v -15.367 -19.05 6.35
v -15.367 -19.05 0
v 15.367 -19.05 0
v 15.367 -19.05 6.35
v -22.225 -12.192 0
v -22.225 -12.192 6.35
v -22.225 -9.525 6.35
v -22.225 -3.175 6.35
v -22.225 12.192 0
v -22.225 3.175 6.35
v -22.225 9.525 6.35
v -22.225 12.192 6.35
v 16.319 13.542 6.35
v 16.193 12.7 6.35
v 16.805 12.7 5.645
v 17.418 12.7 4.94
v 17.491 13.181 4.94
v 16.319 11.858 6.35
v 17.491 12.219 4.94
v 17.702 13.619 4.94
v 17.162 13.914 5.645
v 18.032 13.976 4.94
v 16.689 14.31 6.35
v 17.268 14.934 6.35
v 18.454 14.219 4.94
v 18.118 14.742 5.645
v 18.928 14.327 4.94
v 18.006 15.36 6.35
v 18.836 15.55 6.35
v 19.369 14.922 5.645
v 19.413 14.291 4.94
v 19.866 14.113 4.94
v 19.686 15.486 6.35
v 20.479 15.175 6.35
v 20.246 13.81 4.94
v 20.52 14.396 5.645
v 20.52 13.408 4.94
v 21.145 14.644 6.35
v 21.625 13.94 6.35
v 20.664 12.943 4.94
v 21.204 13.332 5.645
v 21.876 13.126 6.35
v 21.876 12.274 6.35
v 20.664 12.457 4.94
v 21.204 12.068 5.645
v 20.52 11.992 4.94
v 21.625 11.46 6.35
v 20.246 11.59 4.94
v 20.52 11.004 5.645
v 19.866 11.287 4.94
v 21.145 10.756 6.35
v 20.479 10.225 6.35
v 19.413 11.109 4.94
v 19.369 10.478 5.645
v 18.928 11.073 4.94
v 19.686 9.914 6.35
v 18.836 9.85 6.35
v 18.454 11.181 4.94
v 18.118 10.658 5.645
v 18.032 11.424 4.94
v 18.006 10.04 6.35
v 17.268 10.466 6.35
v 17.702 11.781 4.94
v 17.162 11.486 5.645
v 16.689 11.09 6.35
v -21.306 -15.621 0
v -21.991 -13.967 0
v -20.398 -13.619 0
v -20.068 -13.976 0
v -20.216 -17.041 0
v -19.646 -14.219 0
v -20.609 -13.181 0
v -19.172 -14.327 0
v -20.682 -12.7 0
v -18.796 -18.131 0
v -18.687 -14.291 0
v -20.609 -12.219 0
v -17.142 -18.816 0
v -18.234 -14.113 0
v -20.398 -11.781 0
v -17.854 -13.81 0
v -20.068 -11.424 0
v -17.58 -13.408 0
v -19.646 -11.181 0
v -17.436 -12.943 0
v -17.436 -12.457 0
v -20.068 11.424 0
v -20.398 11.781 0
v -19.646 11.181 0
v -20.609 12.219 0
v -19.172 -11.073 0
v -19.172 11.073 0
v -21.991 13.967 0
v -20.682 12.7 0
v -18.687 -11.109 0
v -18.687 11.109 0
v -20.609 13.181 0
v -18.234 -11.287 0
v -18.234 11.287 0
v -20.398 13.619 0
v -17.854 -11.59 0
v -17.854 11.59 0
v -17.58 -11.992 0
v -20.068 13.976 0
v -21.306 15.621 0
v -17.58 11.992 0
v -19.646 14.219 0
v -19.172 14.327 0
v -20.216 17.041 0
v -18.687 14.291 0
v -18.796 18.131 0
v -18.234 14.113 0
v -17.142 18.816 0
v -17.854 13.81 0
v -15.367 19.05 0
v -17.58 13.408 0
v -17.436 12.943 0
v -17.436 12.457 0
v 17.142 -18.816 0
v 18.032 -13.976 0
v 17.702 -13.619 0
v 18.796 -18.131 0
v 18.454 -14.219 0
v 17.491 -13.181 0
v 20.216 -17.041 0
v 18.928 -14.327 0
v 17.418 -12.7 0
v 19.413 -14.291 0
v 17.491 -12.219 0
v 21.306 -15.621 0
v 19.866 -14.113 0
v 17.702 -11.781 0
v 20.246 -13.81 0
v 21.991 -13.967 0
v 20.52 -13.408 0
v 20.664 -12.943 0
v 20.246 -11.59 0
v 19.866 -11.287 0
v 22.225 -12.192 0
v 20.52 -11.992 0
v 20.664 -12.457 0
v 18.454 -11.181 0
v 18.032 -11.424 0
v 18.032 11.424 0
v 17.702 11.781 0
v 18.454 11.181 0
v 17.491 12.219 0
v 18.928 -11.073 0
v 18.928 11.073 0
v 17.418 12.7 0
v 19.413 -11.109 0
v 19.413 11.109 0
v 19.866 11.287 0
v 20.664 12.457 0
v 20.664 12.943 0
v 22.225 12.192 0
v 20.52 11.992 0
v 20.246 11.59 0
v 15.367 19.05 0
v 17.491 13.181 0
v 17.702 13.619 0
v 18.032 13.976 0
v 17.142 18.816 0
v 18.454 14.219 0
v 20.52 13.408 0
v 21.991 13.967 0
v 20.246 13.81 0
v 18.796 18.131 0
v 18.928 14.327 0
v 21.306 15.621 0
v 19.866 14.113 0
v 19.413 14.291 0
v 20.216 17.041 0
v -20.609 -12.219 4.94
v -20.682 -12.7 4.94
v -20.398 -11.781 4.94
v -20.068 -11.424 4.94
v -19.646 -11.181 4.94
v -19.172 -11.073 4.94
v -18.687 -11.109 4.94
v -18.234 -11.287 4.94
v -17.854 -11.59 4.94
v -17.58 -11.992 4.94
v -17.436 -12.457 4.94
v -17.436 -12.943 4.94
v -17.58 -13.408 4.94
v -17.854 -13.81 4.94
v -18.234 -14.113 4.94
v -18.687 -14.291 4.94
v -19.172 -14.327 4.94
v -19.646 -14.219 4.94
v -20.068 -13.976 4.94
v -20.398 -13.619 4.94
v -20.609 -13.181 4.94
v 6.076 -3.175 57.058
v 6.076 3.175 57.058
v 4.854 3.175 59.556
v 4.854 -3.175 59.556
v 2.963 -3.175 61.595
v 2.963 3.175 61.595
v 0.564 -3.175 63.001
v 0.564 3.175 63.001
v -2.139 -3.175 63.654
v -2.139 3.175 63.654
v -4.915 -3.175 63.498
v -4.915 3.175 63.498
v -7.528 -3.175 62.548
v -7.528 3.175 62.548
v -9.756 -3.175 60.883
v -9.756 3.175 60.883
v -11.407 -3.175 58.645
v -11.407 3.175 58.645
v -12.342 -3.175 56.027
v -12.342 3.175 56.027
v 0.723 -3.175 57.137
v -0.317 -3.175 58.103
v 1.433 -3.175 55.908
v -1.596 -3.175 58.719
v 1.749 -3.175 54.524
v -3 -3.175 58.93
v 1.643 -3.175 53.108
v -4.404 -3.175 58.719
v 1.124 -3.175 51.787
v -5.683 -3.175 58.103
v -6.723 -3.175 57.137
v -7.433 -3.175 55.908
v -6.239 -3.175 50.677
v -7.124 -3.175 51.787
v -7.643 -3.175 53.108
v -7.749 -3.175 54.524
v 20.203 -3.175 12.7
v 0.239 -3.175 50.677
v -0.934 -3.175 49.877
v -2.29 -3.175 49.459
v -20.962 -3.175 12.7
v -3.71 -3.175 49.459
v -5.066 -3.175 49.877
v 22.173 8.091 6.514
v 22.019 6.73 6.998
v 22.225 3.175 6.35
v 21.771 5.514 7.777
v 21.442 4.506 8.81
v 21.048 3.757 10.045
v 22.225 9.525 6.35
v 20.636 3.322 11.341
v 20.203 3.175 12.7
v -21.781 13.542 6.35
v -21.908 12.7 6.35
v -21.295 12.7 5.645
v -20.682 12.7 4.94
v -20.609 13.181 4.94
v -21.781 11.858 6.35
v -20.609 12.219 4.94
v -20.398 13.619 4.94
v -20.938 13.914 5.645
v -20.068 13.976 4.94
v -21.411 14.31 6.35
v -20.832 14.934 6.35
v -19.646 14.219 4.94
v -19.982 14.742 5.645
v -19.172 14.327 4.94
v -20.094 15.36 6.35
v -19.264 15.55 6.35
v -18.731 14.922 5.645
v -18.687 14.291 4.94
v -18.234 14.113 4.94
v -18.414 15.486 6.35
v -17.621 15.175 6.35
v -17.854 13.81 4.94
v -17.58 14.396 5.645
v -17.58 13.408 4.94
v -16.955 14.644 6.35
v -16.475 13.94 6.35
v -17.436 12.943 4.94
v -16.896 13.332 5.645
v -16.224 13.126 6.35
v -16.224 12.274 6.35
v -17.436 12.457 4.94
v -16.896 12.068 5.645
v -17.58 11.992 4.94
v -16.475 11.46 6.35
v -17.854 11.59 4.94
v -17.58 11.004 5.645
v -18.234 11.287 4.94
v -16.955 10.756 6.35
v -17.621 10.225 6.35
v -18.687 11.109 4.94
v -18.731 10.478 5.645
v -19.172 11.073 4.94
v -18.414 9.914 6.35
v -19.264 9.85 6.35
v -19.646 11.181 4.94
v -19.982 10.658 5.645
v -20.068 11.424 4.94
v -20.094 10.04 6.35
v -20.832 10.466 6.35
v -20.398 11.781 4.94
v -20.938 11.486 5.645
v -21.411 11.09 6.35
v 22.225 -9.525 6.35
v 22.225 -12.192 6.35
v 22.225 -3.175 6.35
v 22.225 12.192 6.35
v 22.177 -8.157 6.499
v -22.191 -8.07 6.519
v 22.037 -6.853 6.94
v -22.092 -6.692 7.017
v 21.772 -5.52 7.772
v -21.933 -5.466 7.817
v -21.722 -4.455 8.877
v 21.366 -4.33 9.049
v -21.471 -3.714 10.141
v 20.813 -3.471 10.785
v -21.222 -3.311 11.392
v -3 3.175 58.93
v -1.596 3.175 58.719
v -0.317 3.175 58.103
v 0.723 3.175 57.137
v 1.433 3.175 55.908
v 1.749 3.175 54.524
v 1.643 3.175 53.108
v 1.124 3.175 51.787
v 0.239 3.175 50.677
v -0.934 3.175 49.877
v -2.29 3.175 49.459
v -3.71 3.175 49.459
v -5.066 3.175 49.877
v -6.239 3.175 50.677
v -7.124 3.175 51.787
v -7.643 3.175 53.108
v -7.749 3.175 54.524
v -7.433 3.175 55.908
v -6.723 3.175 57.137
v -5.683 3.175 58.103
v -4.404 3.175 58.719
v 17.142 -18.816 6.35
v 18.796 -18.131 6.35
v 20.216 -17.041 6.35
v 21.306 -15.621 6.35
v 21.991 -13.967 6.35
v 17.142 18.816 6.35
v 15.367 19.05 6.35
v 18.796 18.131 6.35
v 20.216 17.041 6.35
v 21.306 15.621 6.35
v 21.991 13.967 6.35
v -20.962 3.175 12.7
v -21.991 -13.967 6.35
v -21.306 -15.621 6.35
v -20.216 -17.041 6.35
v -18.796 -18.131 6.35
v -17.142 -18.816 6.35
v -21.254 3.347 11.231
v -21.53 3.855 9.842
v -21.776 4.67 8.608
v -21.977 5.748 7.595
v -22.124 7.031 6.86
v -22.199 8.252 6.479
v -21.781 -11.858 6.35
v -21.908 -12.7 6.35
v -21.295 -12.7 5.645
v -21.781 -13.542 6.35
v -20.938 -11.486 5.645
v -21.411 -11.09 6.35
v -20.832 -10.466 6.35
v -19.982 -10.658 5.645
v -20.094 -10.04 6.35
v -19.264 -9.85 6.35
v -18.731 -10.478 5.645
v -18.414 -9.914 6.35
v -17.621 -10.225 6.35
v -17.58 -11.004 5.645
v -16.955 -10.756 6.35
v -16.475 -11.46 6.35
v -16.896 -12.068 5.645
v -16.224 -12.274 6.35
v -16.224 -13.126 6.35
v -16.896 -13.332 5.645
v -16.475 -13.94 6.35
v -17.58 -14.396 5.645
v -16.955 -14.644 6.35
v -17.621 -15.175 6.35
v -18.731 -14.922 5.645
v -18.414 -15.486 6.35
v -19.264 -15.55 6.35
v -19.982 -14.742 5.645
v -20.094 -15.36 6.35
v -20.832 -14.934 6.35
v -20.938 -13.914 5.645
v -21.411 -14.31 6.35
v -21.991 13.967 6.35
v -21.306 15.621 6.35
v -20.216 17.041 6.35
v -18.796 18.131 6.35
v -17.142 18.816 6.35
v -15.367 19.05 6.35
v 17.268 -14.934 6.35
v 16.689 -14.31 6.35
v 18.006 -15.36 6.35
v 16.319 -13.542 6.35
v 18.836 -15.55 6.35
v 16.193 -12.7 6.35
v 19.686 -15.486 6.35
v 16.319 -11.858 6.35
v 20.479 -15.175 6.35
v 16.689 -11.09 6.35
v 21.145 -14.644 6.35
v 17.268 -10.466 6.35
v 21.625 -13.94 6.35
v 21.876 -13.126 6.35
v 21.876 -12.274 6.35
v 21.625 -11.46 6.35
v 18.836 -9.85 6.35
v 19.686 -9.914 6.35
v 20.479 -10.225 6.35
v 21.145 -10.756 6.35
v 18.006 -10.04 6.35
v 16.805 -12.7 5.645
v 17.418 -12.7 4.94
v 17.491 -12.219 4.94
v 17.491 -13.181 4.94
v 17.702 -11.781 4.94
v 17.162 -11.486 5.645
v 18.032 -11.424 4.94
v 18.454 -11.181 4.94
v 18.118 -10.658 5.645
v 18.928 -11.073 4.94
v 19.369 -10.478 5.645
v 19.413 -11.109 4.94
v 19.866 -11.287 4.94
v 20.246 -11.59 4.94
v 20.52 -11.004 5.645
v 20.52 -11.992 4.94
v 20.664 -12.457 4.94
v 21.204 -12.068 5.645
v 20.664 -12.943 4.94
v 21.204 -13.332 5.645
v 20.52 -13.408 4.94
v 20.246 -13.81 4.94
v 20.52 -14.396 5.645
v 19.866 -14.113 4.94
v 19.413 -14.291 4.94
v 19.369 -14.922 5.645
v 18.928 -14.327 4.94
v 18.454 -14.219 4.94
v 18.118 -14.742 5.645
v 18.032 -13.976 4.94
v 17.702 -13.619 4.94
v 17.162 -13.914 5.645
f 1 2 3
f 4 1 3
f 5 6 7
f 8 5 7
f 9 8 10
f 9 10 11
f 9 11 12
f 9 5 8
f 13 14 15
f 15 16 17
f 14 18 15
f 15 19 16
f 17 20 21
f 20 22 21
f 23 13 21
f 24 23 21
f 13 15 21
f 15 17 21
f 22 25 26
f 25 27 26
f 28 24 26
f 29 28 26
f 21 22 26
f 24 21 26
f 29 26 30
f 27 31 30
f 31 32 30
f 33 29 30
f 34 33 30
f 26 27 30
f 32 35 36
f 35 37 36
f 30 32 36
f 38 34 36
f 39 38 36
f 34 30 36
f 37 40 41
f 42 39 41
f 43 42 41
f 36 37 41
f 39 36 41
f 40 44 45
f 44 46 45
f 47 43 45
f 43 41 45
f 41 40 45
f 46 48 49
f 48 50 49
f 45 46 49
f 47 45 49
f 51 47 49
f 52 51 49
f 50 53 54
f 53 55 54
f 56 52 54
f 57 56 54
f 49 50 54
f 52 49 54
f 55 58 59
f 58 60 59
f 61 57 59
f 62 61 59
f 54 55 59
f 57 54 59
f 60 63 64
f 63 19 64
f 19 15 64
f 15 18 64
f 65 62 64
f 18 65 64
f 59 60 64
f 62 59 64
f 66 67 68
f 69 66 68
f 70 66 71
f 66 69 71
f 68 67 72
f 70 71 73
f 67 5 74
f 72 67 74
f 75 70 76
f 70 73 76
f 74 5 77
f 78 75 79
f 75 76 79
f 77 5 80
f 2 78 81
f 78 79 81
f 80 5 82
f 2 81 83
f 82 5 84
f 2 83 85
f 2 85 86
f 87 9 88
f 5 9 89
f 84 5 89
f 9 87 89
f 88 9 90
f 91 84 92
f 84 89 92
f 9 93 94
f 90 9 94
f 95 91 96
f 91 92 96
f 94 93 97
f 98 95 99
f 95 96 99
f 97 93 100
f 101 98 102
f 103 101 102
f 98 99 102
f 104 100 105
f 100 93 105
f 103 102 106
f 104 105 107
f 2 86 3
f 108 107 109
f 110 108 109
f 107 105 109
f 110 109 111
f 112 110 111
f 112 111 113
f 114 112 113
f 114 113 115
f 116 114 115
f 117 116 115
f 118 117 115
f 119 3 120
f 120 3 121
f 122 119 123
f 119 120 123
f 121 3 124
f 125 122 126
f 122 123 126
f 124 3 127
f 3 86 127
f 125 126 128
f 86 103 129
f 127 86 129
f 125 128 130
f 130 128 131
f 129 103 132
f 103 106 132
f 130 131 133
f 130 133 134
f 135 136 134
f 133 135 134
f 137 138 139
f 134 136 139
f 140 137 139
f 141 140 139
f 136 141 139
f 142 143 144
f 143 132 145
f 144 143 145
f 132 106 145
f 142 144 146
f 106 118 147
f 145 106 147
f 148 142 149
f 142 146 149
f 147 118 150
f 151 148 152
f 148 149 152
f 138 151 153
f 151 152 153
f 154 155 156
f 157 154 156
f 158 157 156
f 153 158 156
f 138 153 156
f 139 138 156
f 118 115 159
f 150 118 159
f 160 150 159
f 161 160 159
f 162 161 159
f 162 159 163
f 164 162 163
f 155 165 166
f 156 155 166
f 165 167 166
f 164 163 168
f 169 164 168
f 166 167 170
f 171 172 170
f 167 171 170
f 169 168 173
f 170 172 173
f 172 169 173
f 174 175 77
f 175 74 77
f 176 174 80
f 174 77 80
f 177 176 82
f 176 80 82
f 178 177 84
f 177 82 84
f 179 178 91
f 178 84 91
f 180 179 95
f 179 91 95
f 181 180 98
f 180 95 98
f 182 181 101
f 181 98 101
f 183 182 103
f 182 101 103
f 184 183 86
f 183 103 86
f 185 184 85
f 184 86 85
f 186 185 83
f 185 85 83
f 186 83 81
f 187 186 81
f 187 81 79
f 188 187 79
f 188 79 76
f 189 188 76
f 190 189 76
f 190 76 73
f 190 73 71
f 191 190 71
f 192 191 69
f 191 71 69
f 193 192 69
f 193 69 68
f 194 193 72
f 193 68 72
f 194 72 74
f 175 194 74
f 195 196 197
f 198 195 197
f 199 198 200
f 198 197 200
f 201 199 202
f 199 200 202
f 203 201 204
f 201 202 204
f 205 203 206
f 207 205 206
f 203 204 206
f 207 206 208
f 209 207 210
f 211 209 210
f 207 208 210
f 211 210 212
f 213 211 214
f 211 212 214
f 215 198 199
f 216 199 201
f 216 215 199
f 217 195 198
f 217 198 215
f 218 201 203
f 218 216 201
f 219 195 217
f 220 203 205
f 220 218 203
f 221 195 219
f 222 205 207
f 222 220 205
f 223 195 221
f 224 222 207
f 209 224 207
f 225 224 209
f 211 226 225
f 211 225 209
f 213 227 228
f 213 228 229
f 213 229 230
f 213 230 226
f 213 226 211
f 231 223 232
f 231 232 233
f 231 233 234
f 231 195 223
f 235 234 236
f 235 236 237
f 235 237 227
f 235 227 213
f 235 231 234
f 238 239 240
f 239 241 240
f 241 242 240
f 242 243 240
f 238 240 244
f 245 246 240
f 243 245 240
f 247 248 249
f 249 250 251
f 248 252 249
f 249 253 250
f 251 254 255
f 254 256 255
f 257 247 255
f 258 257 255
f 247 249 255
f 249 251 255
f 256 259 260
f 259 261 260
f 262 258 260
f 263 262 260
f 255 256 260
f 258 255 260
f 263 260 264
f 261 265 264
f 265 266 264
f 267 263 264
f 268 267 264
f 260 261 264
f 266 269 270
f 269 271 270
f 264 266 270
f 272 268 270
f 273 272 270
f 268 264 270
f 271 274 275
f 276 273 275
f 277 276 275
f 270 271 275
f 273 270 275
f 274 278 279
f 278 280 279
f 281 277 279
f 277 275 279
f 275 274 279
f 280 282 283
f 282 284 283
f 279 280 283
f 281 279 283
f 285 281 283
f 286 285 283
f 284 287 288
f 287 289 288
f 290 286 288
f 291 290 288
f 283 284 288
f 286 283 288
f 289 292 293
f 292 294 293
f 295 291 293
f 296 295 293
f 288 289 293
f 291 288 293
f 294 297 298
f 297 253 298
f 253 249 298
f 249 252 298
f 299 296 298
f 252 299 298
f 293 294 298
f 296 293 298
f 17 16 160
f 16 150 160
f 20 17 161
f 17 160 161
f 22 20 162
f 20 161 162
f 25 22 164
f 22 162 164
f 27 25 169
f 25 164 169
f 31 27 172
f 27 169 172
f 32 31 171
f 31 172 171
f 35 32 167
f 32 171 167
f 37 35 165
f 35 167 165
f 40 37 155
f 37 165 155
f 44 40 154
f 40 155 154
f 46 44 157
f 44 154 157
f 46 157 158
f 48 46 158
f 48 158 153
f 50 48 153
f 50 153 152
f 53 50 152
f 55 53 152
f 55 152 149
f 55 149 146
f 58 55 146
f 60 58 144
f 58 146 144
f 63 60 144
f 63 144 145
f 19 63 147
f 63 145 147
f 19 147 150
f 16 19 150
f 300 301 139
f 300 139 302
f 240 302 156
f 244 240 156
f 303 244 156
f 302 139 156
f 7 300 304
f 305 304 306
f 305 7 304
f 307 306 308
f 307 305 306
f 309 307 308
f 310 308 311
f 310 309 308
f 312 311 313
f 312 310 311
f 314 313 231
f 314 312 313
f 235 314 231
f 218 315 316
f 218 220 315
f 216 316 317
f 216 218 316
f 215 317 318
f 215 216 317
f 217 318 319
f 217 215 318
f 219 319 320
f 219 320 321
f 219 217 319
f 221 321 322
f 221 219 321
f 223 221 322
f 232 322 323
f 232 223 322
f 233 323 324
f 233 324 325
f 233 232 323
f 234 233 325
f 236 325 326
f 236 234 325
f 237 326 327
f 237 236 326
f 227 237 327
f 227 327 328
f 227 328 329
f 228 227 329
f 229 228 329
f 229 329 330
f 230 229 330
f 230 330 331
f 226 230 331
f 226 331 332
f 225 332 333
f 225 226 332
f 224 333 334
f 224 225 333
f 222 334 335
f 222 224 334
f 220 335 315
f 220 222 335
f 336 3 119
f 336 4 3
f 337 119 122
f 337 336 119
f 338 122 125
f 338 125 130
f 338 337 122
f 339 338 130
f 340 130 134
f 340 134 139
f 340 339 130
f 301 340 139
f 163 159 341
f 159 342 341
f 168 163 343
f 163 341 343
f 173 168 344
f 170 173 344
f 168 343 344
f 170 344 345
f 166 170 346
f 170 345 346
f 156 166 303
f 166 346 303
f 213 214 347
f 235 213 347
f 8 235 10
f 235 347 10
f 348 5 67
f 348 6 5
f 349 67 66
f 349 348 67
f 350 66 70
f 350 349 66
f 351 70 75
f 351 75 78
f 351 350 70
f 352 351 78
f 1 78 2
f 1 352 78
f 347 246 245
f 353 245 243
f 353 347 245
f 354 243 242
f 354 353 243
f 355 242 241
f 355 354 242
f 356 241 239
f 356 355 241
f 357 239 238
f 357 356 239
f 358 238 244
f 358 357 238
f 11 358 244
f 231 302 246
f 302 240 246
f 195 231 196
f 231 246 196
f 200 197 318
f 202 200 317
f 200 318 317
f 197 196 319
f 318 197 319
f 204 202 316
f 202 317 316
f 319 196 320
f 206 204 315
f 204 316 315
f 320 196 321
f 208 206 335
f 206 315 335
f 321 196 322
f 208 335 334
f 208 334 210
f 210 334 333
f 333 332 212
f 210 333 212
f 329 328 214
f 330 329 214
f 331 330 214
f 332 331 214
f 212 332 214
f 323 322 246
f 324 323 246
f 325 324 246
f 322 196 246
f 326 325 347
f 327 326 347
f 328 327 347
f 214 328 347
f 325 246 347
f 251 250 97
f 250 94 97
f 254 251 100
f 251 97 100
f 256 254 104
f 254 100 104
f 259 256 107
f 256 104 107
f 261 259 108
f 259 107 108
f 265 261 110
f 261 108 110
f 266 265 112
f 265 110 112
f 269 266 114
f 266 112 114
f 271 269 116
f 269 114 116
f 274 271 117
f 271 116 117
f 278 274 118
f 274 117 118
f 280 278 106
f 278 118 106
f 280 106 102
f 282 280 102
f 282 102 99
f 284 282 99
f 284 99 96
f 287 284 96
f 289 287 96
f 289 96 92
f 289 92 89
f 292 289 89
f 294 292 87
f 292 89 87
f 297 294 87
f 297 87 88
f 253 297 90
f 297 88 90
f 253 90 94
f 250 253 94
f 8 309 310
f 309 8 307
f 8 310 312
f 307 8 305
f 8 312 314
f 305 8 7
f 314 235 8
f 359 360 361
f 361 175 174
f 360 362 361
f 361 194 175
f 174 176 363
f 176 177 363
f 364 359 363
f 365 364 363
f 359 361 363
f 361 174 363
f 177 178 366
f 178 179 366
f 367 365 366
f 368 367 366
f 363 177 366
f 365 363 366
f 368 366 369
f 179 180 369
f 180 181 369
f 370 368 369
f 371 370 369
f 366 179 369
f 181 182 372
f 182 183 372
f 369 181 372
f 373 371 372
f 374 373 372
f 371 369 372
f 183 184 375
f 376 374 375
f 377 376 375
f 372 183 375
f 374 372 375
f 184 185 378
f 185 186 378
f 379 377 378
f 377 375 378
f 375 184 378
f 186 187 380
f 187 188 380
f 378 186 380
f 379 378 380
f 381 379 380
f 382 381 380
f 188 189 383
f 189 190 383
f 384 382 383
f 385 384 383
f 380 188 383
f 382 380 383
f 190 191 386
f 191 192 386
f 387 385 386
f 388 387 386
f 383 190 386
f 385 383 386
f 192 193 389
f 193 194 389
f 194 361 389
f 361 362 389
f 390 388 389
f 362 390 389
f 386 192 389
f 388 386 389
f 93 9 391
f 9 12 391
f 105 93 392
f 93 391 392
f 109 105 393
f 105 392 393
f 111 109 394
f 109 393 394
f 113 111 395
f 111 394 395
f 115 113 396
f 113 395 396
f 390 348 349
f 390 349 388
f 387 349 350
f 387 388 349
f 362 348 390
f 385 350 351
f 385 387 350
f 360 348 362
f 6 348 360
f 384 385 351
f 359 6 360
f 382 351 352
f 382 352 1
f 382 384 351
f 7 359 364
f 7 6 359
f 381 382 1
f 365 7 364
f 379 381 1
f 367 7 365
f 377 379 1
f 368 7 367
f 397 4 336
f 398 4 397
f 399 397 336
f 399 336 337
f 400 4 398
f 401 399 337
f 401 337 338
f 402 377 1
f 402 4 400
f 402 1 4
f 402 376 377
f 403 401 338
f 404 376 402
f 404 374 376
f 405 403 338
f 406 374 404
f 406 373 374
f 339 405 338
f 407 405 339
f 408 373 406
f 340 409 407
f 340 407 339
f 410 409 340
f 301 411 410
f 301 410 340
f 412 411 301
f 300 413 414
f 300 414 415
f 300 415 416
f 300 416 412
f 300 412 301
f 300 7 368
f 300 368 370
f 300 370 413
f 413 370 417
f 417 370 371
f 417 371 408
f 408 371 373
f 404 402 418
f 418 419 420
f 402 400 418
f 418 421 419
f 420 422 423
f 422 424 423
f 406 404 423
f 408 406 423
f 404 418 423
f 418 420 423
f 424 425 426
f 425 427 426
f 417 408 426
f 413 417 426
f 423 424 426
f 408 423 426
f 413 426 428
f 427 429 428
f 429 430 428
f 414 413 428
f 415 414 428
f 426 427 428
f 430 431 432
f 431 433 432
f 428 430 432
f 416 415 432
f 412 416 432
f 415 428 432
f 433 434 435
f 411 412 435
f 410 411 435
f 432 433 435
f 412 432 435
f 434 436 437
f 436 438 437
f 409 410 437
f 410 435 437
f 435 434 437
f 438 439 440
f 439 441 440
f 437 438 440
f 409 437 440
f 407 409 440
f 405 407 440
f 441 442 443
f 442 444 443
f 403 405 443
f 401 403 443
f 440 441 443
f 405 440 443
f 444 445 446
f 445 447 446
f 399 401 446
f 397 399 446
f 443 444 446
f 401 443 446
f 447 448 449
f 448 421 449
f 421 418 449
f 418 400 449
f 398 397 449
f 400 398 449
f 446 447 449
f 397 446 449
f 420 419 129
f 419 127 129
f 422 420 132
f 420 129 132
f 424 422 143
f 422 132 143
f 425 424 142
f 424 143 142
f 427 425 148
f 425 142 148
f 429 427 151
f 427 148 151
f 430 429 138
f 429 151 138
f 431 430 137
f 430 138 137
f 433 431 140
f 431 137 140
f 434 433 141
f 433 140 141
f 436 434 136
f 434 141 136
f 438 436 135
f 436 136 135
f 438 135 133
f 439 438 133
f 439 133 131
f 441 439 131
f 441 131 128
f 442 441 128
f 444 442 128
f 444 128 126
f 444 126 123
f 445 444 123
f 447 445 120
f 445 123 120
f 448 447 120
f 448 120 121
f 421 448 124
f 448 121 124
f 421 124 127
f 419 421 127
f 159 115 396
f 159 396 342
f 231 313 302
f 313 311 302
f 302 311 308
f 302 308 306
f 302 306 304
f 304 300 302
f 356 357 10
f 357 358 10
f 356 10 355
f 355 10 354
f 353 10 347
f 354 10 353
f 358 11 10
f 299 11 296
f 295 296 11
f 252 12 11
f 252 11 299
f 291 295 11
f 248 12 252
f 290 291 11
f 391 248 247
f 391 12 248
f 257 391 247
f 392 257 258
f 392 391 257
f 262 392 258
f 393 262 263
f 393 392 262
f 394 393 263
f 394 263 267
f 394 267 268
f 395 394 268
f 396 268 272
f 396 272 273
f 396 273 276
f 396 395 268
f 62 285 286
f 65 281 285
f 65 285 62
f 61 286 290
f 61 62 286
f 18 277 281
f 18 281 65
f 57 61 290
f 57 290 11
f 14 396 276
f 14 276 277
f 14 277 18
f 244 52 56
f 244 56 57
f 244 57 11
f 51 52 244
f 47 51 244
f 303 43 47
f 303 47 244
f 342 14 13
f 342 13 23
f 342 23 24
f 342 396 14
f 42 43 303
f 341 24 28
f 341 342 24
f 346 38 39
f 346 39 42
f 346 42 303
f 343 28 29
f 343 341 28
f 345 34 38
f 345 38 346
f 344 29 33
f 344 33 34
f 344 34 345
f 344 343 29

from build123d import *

# Parameters (mm, degrees)
SKETCH1_W                                      = 44.45
SKETCH1_H                                      = 38.1
BOSS_EXTRUDE1_DEPTH                            = 6.35
CSK_FOR_4_FLAT_HEAD_MACHINE_SCREW1_D           = 3.2639
CSK_FOR_4_FLAT_HEAD_MACHINE_SCREW1_CSINK_D     = 5.715
CSK_FOR_4_FLAT_HEAD_MACHINE_SCREW1_CSINK_ANGLE = 82
SKETCH4_R                                      = 4.7625
BOSS_EXTRUDE2_DEPTH                            = 3.175
FILLET2_R                                      = 6.858
FILLET3_R                                      = 6.35


with BuildPart() as part:
    # Sketch1 → Boss-Extrude1 (new body)
    with BuildSketch(Plane.XY):
        Rectangle(SKETCH1_W, SKETCH1_H)
    extrude(amount=BOSS_EXTRUDE1_DEPTH)

    # CSK for #4 Flat Head Machine Screw1 (through all)
    with Locations(Plane.XY.offset(6.35)):
        with Locations((-19.05, 12.7), (19.05, -12.7), (-19.05, -12.7), (19.05, 12.7)):
            CounterSinkHole(CSK_FOR_4_FLAT_HEAD_MACHINE_SCREW1_D / 2, CSK_FOR_4_FLAT_HEAD_MACHINE_SCREW1_CSINK_D / 2, counter_sink_angle=CSK_FOR_4_FLAT_HEAD_MACHINE_SCREW1_CSINK_ANGLE)

    # Sketch4 → Boss-Extrude2 (add, symmetric)
    with BuildSketch(Plane(origin=(0, 0, 0), x_dir=(1, 0, 0), z_dir=(0, 1, 0))):
        with BuildLine():
            Line((-12.341914895, -56.026561414), (-22.225, -6.35))
            Line((-22.225, -6.35), (22.225, -6.35))
            Line((22.225, -6.35), (6.07586016, -57.058395803))
            ThreePointArc((6.07586016, -57.058395803), (-3.532791524, -63.678087179), (-12.341914895, -56.026561414))
        make_face()
        with Locations(Location((-2.99999997, -54.168, 0), (0, 0, 270))):
            Circle(SKETCH4_R, mode=Mode.SUBTRACT)
    extrude(amount=BOSS_EXTRUDE2_DEPTH, both=True)

    # Fillet2
    fillet2_edges = [part.edges().sort_by_distance(p)[0] for p in [
        (22.225, -19.05, 3.175),
        (-22.225, -19.05, 3.175),
        (-22.225, 19.05, 3.175),
        (22.225, 19.05, 3.175),
    ]]
    fillet(fillet2_edges, radius=FILLET2_R)

    # Fillet3
    # the kernel refuses this fillet: 6.35 mm, written as the material it adds along each edge
    with BuildSketch(Plane(origin=(-22.225, 3.175, 6.35), x_dir=(0, 1, 0), z_dir=(1, 0, 0))) as fillet3_piece_1_section:
        with BuildLine():
            CenterArc((FILLET3_R, FILLET3_R), FILLET3_R, 180, 90)
            Line((0, FILLET3_R), (0, 0))
            Line((0, 0), (FILLET3_R, 0))
        make_face()
    fillet3_piece_1 = extrude(amount=44.45, mode=Mode.PRIVATE)
    fillet3_piece_1 = split(fillet3_piece_1, bisect_by=Plane(origin=(-21.111154549, 4.625615872, 11.948657846), z_dir=(0.980778469831864, 0, -0.19512455794765435)), keep=Keep.TOP, mode=Mode.PRIVATE)
    fillet3_piece_1 = split(fillet3_piece_1, bisect_by=Plane(origin=(19.761324723, 4.625615872, 14.085955123), z_dir=(-0.9528462078877957, 0, -0.30345362761688605)), keep=Keep.TOP, mode=Mode.PRIVATE)
    add(fillet3_piece_1)
    with BuildSketch(Plane(origin=(-22.225, -3.175, 6.35), x_dir=(0, -1, 0), z_dir=(1, 0, 0))) as fillet3_piece_2_section:
        with BuildLine():
            CenterArc((FILLET3_R, -FILLET3_R), FILLET3_R, 90, 90)
            Line((0, -FILLET3_R), (0, 0))
            Line((0, 0), (FILLET3_R, 0))
        make_face()
    fillet3_piece_2 = extrude(amount=44.45, mode=Mode.PRIVATE)
    fillet3_piece_2 = split(fillet3_piece_2, bisect_by=Plane(origin=(-21.111154549, -4.625615872, 11.948657846), z_dir=(0.980778469831864, 0, -0.19512455794765435)), keep=Keep.TOP, mode=Mode.PRIVATE)
    fillet3_piece_2 = split(fillet3_piece_2, bisect_by=Plane(origin=(19.761324723, -4.625615872, 14.085955123), z_dir=(-0.9528462078877957, 0, -0.30345362761688605)), keep=Keep.TOP, mode=Mode.PRIVATE)
    add(fillet3_piece_2)


solid = part.part
